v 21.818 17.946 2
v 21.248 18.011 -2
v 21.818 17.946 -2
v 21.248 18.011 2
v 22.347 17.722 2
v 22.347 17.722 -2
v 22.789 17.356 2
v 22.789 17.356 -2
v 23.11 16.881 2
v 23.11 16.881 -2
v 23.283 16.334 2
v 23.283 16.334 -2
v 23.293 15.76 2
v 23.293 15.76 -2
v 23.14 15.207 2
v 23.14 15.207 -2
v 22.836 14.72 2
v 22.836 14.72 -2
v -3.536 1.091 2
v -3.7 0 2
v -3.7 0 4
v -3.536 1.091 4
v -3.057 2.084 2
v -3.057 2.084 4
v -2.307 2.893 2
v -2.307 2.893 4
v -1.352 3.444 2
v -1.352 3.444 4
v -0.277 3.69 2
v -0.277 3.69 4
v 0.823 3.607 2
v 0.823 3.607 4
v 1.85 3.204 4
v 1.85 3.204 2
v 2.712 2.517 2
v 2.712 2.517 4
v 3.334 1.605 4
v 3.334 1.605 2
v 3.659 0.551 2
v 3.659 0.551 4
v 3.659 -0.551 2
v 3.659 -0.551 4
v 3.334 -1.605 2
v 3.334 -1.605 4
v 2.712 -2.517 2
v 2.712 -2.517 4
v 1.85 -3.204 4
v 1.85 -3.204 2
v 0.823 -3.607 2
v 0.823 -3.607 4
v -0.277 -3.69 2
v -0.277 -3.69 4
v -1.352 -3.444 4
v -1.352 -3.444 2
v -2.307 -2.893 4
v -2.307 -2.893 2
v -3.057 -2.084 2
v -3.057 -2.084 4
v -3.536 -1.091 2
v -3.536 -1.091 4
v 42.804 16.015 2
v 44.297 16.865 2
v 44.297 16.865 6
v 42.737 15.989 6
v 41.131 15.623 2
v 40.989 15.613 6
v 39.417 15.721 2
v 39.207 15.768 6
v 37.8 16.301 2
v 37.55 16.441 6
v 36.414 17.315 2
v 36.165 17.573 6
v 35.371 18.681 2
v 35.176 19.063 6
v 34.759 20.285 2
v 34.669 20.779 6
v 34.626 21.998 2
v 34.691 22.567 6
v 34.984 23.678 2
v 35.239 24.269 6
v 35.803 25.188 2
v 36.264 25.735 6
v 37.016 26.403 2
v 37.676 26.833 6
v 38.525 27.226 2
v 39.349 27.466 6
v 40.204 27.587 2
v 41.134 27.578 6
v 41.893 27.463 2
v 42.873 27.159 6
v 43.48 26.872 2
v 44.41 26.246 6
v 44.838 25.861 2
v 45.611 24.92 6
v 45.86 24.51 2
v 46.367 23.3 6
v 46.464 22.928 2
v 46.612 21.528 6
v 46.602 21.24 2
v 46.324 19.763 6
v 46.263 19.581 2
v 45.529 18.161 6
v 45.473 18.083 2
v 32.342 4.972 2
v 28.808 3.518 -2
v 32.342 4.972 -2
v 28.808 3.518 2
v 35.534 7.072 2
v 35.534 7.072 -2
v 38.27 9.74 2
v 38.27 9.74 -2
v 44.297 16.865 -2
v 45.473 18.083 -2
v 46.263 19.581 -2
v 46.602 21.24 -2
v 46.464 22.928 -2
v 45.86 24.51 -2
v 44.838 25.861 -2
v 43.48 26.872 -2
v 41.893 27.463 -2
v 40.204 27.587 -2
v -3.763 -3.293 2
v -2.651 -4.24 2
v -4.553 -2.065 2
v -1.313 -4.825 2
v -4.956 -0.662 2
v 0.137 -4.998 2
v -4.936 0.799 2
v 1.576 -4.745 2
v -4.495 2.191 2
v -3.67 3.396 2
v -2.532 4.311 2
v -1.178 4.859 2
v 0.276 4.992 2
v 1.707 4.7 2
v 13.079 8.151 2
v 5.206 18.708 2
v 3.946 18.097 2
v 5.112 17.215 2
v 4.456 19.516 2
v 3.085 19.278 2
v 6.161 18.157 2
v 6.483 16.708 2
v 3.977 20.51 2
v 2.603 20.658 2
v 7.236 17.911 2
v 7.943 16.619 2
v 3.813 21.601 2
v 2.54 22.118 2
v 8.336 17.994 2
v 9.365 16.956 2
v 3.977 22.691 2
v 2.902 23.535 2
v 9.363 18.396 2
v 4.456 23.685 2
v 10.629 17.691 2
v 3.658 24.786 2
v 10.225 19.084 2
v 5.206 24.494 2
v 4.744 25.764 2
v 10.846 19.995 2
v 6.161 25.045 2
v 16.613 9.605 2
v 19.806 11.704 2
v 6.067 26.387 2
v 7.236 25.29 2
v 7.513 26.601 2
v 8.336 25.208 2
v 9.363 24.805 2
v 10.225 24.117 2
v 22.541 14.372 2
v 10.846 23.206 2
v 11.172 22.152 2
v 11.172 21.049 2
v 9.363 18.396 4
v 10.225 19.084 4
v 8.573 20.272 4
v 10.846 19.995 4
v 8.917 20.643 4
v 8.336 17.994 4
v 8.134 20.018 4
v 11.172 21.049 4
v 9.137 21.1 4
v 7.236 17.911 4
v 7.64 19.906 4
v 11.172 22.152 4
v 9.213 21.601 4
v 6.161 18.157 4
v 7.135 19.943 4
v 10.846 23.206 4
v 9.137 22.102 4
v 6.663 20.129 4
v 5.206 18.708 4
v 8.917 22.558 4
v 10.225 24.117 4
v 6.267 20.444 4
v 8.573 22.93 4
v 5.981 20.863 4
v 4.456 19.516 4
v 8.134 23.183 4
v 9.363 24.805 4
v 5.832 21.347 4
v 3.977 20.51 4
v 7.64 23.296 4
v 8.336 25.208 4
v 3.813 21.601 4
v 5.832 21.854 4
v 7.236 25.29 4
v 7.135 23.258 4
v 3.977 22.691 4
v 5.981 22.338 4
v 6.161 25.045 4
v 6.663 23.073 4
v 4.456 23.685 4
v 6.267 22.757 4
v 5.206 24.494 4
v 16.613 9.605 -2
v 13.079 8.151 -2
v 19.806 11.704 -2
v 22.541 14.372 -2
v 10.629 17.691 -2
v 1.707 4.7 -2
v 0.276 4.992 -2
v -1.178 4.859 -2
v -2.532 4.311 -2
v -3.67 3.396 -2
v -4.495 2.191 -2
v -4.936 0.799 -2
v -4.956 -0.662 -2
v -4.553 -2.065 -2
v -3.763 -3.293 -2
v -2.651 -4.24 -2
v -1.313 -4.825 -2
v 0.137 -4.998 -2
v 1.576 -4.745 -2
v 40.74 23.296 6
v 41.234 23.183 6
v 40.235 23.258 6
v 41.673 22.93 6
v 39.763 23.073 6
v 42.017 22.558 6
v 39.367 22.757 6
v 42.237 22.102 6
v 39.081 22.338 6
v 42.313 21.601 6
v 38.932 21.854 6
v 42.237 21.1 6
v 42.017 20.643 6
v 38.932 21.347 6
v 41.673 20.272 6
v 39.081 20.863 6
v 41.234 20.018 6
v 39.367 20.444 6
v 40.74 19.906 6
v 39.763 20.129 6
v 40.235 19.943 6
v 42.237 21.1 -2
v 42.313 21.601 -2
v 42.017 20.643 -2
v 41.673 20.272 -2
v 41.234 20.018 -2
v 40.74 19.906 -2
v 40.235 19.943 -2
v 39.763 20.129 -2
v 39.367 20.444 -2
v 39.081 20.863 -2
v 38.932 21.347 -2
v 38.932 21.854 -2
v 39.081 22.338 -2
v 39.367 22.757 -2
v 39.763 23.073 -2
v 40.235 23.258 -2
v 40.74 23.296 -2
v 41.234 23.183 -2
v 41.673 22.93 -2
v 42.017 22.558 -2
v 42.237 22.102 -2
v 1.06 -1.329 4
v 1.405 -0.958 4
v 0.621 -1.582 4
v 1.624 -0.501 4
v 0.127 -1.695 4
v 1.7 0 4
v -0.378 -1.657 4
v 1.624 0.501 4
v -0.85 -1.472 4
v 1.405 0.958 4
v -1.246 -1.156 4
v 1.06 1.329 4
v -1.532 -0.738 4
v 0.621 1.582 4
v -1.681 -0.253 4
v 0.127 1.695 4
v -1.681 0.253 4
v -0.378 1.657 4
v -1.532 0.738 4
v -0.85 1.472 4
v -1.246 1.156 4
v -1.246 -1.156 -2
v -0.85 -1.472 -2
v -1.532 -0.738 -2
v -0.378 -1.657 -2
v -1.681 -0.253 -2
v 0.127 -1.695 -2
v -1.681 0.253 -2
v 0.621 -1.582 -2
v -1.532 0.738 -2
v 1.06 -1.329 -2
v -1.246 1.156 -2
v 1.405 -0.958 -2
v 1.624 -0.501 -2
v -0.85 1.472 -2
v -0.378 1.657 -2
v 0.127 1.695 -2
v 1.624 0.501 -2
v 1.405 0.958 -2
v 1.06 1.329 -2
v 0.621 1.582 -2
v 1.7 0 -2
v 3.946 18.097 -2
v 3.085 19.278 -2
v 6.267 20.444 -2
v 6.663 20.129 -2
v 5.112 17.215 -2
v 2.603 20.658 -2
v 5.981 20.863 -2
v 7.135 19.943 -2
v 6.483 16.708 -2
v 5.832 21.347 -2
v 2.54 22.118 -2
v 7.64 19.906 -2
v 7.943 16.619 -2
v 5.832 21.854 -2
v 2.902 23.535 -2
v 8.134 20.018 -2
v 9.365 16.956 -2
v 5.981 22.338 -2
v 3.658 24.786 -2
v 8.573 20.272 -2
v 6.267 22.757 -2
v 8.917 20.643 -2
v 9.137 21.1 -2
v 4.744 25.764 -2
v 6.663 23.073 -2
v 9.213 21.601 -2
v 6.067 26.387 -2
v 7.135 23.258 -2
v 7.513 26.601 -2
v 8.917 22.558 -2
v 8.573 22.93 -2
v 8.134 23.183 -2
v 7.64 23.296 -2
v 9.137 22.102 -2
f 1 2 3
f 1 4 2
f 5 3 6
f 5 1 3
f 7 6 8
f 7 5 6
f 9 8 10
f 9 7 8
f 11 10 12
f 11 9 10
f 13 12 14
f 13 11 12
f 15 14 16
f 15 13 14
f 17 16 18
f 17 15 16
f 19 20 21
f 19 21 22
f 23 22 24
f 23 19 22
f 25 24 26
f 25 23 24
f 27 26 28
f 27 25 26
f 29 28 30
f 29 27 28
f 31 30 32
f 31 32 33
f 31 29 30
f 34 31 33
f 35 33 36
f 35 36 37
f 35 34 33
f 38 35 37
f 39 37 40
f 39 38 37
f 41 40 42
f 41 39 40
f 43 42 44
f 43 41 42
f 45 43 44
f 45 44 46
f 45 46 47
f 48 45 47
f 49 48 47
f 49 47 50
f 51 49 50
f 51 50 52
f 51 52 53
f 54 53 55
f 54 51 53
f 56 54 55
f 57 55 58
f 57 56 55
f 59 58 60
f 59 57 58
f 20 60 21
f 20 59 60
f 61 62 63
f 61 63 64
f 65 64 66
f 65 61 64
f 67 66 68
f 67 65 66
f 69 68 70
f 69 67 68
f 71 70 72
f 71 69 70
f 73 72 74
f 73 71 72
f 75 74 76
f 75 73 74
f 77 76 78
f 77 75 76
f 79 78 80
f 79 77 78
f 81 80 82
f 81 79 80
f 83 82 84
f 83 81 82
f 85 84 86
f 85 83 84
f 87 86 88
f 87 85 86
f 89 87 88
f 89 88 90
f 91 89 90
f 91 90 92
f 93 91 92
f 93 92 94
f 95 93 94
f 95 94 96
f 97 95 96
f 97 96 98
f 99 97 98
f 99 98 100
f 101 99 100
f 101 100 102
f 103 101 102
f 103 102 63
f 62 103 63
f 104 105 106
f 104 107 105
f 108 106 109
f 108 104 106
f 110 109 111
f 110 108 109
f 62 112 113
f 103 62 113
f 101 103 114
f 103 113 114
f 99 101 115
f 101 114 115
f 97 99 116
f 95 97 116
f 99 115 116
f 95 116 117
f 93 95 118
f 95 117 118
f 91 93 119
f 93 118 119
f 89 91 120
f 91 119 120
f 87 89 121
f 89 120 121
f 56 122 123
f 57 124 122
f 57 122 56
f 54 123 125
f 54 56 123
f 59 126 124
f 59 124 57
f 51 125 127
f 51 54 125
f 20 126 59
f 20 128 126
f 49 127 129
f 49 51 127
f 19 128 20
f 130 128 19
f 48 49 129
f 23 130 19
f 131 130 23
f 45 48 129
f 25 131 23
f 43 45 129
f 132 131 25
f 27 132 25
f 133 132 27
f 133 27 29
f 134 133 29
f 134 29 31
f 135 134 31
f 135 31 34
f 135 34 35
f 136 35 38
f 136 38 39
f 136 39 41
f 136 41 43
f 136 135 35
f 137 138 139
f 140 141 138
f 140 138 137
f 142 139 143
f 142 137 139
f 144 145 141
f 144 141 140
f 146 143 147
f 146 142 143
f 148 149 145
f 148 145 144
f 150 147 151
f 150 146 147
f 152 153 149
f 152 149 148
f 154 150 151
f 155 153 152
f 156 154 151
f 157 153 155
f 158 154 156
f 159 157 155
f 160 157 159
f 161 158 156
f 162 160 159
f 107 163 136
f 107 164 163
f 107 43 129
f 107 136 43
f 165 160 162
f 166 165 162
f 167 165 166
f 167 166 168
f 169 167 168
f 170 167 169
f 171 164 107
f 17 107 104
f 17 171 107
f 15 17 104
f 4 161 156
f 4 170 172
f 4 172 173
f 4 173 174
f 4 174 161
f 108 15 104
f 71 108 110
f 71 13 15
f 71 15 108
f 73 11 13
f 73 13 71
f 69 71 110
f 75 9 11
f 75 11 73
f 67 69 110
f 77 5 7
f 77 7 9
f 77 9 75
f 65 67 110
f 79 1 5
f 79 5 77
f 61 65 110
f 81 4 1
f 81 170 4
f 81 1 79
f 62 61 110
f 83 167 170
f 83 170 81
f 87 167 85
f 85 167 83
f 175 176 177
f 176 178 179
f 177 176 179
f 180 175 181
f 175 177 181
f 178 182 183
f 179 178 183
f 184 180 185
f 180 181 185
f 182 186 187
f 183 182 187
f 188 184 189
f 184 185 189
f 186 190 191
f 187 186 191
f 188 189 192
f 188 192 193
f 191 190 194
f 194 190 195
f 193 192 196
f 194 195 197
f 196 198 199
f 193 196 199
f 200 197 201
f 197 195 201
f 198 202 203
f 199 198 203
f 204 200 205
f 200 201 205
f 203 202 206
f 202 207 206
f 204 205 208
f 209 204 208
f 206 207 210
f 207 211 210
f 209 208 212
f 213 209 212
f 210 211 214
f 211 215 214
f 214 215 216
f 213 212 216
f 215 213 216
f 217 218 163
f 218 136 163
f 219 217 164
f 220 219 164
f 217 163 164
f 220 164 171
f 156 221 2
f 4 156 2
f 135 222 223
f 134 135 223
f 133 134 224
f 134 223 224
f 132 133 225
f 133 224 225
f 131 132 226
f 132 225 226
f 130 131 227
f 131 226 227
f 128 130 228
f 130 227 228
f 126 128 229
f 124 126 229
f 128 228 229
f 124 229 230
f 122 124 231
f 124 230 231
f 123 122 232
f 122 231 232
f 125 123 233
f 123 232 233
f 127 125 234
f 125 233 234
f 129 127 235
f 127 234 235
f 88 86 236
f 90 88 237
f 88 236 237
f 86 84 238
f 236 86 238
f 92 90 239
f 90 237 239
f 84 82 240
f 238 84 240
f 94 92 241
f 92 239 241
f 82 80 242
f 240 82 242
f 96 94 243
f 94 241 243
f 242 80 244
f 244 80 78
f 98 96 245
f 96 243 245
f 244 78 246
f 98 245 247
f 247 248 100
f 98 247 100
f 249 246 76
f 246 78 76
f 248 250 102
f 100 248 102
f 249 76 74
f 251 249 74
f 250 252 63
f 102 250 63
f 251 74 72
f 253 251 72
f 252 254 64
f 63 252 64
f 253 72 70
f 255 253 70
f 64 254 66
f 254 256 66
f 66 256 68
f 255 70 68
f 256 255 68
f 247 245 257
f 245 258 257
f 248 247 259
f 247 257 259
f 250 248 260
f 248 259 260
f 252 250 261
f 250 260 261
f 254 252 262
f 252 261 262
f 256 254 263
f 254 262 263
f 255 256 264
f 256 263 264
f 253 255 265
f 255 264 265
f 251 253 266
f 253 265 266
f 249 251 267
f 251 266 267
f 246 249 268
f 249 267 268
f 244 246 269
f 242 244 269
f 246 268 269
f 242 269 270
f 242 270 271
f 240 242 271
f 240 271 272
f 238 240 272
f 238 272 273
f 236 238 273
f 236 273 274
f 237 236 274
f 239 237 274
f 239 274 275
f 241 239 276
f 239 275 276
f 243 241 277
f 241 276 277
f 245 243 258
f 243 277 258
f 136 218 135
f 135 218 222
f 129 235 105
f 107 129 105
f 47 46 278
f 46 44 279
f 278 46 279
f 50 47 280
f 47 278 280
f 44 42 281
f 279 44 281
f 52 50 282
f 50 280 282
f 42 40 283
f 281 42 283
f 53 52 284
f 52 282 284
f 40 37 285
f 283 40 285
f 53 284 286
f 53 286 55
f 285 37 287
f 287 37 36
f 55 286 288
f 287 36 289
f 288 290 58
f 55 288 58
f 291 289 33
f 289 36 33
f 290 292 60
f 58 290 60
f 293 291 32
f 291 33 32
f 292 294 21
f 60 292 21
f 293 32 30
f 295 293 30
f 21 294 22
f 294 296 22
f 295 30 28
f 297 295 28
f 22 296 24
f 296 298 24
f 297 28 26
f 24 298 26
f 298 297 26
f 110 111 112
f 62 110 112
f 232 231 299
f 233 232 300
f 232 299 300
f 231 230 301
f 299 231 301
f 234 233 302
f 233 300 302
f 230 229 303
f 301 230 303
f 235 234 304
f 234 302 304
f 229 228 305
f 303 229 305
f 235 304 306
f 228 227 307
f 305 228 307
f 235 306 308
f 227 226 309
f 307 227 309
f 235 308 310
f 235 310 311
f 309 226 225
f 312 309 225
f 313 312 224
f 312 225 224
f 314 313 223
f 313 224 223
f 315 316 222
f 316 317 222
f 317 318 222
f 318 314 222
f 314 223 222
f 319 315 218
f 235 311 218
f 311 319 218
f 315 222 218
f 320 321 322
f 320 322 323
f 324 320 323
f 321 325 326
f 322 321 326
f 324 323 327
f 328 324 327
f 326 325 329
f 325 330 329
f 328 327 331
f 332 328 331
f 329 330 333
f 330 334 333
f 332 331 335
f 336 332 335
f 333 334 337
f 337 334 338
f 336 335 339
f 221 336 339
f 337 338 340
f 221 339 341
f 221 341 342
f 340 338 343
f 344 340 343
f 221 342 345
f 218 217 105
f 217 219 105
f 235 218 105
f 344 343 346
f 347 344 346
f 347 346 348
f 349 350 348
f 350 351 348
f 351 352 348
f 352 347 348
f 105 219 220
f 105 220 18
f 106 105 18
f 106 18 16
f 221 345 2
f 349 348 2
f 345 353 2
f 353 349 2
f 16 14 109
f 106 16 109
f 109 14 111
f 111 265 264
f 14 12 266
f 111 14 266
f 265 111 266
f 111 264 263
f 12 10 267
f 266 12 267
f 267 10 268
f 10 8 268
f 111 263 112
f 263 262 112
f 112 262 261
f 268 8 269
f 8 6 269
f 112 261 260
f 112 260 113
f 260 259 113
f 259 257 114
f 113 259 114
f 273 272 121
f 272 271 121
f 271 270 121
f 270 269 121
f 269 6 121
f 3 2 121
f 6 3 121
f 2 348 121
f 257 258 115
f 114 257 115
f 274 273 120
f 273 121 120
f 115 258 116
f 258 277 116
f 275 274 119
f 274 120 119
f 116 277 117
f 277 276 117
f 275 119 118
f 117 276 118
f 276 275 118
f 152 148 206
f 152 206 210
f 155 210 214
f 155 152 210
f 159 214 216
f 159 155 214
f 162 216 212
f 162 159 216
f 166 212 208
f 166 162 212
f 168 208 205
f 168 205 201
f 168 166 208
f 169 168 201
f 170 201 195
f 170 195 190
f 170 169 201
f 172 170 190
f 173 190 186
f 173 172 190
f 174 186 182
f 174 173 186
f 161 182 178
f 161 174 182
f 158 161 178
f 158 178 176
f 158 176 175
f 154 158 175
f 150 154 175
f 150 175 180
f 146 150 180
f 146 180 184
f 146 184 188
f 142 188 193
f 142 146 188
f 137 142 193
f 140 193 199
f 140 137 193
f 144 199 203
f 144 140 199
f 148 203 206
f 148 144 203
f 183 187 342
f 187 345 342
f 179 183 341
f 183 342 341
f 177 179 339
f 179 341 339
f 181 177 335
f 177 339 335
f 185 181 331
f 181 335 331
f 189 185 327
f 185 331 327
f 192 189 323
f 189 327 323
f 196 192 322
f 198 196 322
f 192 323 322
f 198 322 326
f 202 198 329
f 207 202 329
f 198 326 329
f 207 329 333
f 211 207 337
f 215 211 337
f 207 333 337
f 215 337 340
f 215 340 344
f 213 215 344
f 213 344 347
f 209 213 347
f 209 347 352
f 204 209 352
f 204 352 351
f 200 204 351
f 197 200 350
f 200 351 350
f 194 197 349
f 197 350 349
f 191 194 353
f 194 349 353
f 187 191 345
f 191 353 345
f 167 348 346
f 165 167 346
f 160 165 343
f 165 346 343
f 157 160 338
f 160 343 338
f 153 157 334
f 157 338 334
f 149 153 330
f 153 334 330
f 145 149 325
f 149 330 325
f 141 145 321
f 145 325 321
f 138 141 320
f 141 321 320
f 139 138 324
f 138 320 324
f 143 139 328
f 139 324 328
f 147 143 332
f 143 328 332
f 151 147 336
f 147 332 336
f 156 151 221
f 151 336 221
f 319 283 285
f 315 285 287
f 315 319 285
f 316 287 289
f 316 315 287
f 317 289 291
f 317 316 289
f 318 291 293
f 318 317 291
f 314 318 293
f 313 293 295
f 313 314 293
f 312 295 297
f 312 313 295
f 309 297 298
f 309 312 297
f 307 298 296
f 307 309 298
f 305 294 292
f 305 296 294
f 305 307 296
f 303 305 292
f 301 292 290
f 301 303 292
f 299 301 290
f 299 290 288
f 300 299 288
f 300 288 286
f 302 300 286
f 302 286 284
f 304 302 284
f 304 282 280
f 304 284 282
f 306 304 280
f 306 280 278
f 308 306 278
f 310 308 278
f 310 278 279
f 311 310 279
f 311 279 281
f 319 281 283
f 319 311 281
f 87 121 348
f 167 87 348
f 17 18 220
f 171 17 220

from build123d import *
from build123d.topology import SkipClean

# Parameters (mm, degrees)
BOSS_EXTRUDE1_DEPTH      = 2
BOSS_EXTRUDE1_DEPTH_BACK = 2
SKETCH2_R                = 1.7
FILLET1_R                = 20
SKETCH7_R                = 6
SKETCH7_R_2              = 1.7
BOSS_EXTRUDE4_DEPTH      = 4
SKETCH8_R                = 3.7
SKETCH8_R_2              = 1.7
BOSS_EXTRUDE5_DEPTH      = 2
FILLET4_R                = 2


with BuildPart() as part:
    # Sketch2 → Boss-Extrude1 (new, two sides: drawn at the far end of the back side and taken through both)
    with BuildSketch(Plane.XY.offset(-BOSS_EXTRUDE1_DEPTH_BACK)):
        with BuildLine():
            ThreePointArc((1.70658462, 4.699741369), (-4.999520368, 0.069253832), (1.575752274, -4.745208612))
            Line((1.575752274, -4.745208612), (34.456924853, 5.232629629))
            Line((34.456924853, 5.232629629), (44.296635241, 16.864742156))
            ThreePointArc((44.296635241, 16.864742156), (46.218376178, 23.740514028), (40.203783054, 27.586810508))
            Line((40.203783054, 27.586810508), (7.512886707, 26.600773906))
            ThreePointArc((7.512886707, 26.600773906), (2.79322071, 19.950091357), (10.629154827, 17.690675057))
            Line((10.629154827, 17.690675057), (25.733767379, 18.146266751))
            Line((25.733767379, 18.146266751), (18.728666276, 9.86511608))
            Line((18.728666276, 9.86511608), (1.70658462, 4.699741369))
        make_face()
        Circle(SKETCH2_R, mode=Mode.SUBTRACT)
        with Locations((7.512886707, 21.600773906)):
            Circle(SKETCH2_R, mode=Mode.SUBTRACT)
        with Locations((40.612886707, 21.600773906)):
            Circle(SKETCH2_R, mode=Mode.SUBTRACT)
    extrude(amount=BOSS_EXTRUDE1_DEPTH + BOSS_EXTRUDE1_DEPTH_BACK)

    # Fillet1
    fillet1_edges = [part.edges().sort_by_distance(p)[0] for p in [
        (34.456924853, 5.232629629, 0),
        (18.728666276, 9.86511608, 0),
    ]]
    fillet(fillet1_edges, radius=FILLET1_R)

    # Sketch7 → Boss-Extrude4 (add)
    with SkipClean():  # the faces are left unmerged after this step: merging them gives an invalid solid
        with BuildSketch(Plane(origin=(0, 0, 2), x_dir=(-1, 0, 0), z_dir=(0, 0, -1))):
            with Locations((-40.612886707, 21.600773906)):
                Circle(SKETCH7_R)
            with Locations((-40.612886707, 21.600773906)):
                Circle(SKETCH7_R_2, mode=Mode.SUBTRACT)
        extrude(amount=-BOSS_EXTRUDE4_DEPTH)

    # Sketch8 → Boss-Extrude5 (add)
    # profile 1 of 2: a face of its own
    with SkipClean():  # the faces are left unmerged after this step: merging them gives an invalid solid
        with BuildSketch(Plane(origin=(0, 0, 2), x_dir=(-1, 0, 0), z_dir=(0, 0, -1))):
            with Locations((-7.512886707, 21.600773906)):
                Circle(SKETCH8_R)
            with Locations((-7.512886707, 21.600773906)):
                Circle(SKETCH8_R_2, mode=Mode.SUBTRACT)
        # profile 2 of 2: a face of its own
        with BuildSketch(Plane(origin=(0, 0, 2), x_dir=(-1, 0, 0), z_dir=(0, 0, -1))):
            Circle(SKETCH8_R)
            Circle(SKETCH8_R_2, mode=Mode.SUBTRACT)
        extrude(amount=-BOSS_EXTRUDE5_DEPTH)

    # Fillet4
    fillet4_edges = [part.edges().sort_by_distance(p)[0] for p in [
        (25.733767379, 18.146266751, 0),
    ]]
    fillet(fillet4_edges, radius=FILLET4_R)


solid = part.part
